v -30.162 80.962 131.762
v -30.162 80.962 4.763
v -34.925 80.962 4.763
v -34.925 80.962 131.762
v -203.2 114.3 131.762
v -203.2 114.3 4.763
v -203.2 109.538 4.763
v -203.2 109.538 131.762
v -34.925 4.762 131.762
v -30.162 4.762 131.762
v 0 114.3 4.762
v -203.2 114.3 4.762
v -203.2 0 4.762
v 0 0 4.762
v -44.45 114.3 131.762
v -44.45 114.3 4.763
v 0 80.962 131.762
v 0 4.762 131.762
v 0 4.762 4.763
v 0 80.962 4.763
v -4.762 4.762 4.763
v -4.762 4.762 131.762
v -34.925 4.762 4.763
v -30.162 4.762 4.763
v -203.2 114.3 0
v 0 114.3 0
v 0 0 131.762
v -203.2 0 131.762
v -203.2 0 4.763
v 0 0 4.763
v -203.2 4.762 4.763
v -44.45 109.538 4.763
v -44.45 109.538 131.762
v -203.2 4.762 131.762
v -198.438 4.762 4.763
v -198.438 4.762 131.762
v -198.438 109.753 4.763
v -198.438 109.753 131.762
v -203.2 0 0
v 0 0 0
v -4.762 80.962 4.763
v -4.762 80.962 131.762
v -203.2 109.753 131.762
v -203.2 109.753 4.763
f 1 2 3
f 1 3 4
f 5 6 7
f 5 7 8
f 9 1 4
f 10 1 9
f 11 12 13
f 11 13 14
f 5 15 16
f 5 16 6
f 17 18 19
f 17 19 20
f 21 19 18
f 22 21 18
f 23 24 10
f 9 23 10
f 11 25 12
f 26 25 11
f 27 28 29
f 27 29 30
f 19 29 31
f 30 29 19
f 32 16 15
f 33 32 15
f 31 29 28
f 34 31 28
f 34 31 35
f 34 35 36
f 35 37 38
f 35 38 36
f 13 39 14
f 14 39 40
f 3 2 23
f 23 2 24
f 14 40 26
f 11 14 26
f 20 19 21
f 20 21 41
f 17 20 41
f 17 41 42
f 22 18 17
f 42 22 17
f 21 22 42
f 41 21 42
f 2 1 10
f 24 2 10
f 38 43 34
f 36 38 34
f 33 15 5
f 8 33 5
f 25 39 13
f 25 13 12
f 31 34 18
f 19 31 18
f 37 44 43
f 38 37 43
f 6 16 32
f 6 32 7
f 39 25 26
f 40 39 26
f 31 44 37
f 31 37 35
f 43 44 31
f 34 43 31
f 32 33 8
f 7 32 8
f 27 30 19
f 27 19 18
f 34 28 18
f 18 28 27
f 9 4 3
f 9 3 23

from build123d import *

# Parameters (mm, degrees)
F0_W      = 203.2
F0_H      = 114.3
F1_DEPTH  = 4.7625
F2_W      = 203.2
F2_H      = 127
F3_DEPTH  = 4.7625
F4_W      = 104.9904679537
F4_H      = 127
F5_DEPTH  = 4.7625
F6_W      = 158.75
F6_H      = 127
F7_DEPTH  = 4.7625
F8_W      = 76.2
F8_H      = 127
F9_DEPTH  = 4.7625
F11_W     = 76.2
F11_H     = 127
F12_DEPTH = 4.7625


with BuildPart() as f1:
    # F0 (on Top) → F1 (new body)
    with BuildSketch(Plane.XY):
        with Locations((-101.6, 57.15)):
            Rectangle(F0_W, F0_H)
    extrude(amount=F1_DEPTH)


with BuildPart() as f3:
    # F2 (on face) → F3 (new body)
    with BuildSketch(Plane.XZ):
        with Locations((-101.6, 68.2625)):
            Rectangle(F2_W, F2_H)
    extrude(amount=-F3_DEPTH)


with BuildPart() as f5:
    # F4 (on face) → F5 (new body)
    with BuildSketch(Plane(origin=(-203.2, 0, 0), x_dir=(0, -1, 0), z_dir=(-1, 0, 0))):
        with Locations((-57.2577339768, 68.2625)):
            Rectangle(F4_W, F4_H)
    extrude(amount=-F5_DEPTH)


with BuildPart() as f7:
    # F6 (on face) → F7 (new body)
    with BuildSketch(Plane(origin=(0, 114.3, 0), x_dir=(-1, 0, 0), z_dir=(0, 1, 0))):
        with Locations((123.825, 68.2625)):
            Rectangle(F6_W, F6_H)
    extrude(amount=-F7_DEPTH)


with BuildPart() as f9:
    # F8 (on face) → F9 (new body)
    with BuildSketch(Plane.YZ):
        with Locations((42.8625, 68.2625)):
            Rectangle(F8_W, F8_H)
    extrude(amount=-F9_DEPTH)


with BuildPart() as f12:
    # F11 (on offset) → F12 (new body)
    with BuildSketch(Plane(origin=(-30.1625, 0, 0), x_dir=(0, -1, 0), z_dir=(-1, 0, 0))):
        with Locations((-42.8625, 68.2625)):
            Rectangle(F11_W, F11_H)
    extrude(amount=F12_DEPTH)


solid = Compound([f1.part, f3.part, f5.part, f7.part, f9.part, f12.part])
